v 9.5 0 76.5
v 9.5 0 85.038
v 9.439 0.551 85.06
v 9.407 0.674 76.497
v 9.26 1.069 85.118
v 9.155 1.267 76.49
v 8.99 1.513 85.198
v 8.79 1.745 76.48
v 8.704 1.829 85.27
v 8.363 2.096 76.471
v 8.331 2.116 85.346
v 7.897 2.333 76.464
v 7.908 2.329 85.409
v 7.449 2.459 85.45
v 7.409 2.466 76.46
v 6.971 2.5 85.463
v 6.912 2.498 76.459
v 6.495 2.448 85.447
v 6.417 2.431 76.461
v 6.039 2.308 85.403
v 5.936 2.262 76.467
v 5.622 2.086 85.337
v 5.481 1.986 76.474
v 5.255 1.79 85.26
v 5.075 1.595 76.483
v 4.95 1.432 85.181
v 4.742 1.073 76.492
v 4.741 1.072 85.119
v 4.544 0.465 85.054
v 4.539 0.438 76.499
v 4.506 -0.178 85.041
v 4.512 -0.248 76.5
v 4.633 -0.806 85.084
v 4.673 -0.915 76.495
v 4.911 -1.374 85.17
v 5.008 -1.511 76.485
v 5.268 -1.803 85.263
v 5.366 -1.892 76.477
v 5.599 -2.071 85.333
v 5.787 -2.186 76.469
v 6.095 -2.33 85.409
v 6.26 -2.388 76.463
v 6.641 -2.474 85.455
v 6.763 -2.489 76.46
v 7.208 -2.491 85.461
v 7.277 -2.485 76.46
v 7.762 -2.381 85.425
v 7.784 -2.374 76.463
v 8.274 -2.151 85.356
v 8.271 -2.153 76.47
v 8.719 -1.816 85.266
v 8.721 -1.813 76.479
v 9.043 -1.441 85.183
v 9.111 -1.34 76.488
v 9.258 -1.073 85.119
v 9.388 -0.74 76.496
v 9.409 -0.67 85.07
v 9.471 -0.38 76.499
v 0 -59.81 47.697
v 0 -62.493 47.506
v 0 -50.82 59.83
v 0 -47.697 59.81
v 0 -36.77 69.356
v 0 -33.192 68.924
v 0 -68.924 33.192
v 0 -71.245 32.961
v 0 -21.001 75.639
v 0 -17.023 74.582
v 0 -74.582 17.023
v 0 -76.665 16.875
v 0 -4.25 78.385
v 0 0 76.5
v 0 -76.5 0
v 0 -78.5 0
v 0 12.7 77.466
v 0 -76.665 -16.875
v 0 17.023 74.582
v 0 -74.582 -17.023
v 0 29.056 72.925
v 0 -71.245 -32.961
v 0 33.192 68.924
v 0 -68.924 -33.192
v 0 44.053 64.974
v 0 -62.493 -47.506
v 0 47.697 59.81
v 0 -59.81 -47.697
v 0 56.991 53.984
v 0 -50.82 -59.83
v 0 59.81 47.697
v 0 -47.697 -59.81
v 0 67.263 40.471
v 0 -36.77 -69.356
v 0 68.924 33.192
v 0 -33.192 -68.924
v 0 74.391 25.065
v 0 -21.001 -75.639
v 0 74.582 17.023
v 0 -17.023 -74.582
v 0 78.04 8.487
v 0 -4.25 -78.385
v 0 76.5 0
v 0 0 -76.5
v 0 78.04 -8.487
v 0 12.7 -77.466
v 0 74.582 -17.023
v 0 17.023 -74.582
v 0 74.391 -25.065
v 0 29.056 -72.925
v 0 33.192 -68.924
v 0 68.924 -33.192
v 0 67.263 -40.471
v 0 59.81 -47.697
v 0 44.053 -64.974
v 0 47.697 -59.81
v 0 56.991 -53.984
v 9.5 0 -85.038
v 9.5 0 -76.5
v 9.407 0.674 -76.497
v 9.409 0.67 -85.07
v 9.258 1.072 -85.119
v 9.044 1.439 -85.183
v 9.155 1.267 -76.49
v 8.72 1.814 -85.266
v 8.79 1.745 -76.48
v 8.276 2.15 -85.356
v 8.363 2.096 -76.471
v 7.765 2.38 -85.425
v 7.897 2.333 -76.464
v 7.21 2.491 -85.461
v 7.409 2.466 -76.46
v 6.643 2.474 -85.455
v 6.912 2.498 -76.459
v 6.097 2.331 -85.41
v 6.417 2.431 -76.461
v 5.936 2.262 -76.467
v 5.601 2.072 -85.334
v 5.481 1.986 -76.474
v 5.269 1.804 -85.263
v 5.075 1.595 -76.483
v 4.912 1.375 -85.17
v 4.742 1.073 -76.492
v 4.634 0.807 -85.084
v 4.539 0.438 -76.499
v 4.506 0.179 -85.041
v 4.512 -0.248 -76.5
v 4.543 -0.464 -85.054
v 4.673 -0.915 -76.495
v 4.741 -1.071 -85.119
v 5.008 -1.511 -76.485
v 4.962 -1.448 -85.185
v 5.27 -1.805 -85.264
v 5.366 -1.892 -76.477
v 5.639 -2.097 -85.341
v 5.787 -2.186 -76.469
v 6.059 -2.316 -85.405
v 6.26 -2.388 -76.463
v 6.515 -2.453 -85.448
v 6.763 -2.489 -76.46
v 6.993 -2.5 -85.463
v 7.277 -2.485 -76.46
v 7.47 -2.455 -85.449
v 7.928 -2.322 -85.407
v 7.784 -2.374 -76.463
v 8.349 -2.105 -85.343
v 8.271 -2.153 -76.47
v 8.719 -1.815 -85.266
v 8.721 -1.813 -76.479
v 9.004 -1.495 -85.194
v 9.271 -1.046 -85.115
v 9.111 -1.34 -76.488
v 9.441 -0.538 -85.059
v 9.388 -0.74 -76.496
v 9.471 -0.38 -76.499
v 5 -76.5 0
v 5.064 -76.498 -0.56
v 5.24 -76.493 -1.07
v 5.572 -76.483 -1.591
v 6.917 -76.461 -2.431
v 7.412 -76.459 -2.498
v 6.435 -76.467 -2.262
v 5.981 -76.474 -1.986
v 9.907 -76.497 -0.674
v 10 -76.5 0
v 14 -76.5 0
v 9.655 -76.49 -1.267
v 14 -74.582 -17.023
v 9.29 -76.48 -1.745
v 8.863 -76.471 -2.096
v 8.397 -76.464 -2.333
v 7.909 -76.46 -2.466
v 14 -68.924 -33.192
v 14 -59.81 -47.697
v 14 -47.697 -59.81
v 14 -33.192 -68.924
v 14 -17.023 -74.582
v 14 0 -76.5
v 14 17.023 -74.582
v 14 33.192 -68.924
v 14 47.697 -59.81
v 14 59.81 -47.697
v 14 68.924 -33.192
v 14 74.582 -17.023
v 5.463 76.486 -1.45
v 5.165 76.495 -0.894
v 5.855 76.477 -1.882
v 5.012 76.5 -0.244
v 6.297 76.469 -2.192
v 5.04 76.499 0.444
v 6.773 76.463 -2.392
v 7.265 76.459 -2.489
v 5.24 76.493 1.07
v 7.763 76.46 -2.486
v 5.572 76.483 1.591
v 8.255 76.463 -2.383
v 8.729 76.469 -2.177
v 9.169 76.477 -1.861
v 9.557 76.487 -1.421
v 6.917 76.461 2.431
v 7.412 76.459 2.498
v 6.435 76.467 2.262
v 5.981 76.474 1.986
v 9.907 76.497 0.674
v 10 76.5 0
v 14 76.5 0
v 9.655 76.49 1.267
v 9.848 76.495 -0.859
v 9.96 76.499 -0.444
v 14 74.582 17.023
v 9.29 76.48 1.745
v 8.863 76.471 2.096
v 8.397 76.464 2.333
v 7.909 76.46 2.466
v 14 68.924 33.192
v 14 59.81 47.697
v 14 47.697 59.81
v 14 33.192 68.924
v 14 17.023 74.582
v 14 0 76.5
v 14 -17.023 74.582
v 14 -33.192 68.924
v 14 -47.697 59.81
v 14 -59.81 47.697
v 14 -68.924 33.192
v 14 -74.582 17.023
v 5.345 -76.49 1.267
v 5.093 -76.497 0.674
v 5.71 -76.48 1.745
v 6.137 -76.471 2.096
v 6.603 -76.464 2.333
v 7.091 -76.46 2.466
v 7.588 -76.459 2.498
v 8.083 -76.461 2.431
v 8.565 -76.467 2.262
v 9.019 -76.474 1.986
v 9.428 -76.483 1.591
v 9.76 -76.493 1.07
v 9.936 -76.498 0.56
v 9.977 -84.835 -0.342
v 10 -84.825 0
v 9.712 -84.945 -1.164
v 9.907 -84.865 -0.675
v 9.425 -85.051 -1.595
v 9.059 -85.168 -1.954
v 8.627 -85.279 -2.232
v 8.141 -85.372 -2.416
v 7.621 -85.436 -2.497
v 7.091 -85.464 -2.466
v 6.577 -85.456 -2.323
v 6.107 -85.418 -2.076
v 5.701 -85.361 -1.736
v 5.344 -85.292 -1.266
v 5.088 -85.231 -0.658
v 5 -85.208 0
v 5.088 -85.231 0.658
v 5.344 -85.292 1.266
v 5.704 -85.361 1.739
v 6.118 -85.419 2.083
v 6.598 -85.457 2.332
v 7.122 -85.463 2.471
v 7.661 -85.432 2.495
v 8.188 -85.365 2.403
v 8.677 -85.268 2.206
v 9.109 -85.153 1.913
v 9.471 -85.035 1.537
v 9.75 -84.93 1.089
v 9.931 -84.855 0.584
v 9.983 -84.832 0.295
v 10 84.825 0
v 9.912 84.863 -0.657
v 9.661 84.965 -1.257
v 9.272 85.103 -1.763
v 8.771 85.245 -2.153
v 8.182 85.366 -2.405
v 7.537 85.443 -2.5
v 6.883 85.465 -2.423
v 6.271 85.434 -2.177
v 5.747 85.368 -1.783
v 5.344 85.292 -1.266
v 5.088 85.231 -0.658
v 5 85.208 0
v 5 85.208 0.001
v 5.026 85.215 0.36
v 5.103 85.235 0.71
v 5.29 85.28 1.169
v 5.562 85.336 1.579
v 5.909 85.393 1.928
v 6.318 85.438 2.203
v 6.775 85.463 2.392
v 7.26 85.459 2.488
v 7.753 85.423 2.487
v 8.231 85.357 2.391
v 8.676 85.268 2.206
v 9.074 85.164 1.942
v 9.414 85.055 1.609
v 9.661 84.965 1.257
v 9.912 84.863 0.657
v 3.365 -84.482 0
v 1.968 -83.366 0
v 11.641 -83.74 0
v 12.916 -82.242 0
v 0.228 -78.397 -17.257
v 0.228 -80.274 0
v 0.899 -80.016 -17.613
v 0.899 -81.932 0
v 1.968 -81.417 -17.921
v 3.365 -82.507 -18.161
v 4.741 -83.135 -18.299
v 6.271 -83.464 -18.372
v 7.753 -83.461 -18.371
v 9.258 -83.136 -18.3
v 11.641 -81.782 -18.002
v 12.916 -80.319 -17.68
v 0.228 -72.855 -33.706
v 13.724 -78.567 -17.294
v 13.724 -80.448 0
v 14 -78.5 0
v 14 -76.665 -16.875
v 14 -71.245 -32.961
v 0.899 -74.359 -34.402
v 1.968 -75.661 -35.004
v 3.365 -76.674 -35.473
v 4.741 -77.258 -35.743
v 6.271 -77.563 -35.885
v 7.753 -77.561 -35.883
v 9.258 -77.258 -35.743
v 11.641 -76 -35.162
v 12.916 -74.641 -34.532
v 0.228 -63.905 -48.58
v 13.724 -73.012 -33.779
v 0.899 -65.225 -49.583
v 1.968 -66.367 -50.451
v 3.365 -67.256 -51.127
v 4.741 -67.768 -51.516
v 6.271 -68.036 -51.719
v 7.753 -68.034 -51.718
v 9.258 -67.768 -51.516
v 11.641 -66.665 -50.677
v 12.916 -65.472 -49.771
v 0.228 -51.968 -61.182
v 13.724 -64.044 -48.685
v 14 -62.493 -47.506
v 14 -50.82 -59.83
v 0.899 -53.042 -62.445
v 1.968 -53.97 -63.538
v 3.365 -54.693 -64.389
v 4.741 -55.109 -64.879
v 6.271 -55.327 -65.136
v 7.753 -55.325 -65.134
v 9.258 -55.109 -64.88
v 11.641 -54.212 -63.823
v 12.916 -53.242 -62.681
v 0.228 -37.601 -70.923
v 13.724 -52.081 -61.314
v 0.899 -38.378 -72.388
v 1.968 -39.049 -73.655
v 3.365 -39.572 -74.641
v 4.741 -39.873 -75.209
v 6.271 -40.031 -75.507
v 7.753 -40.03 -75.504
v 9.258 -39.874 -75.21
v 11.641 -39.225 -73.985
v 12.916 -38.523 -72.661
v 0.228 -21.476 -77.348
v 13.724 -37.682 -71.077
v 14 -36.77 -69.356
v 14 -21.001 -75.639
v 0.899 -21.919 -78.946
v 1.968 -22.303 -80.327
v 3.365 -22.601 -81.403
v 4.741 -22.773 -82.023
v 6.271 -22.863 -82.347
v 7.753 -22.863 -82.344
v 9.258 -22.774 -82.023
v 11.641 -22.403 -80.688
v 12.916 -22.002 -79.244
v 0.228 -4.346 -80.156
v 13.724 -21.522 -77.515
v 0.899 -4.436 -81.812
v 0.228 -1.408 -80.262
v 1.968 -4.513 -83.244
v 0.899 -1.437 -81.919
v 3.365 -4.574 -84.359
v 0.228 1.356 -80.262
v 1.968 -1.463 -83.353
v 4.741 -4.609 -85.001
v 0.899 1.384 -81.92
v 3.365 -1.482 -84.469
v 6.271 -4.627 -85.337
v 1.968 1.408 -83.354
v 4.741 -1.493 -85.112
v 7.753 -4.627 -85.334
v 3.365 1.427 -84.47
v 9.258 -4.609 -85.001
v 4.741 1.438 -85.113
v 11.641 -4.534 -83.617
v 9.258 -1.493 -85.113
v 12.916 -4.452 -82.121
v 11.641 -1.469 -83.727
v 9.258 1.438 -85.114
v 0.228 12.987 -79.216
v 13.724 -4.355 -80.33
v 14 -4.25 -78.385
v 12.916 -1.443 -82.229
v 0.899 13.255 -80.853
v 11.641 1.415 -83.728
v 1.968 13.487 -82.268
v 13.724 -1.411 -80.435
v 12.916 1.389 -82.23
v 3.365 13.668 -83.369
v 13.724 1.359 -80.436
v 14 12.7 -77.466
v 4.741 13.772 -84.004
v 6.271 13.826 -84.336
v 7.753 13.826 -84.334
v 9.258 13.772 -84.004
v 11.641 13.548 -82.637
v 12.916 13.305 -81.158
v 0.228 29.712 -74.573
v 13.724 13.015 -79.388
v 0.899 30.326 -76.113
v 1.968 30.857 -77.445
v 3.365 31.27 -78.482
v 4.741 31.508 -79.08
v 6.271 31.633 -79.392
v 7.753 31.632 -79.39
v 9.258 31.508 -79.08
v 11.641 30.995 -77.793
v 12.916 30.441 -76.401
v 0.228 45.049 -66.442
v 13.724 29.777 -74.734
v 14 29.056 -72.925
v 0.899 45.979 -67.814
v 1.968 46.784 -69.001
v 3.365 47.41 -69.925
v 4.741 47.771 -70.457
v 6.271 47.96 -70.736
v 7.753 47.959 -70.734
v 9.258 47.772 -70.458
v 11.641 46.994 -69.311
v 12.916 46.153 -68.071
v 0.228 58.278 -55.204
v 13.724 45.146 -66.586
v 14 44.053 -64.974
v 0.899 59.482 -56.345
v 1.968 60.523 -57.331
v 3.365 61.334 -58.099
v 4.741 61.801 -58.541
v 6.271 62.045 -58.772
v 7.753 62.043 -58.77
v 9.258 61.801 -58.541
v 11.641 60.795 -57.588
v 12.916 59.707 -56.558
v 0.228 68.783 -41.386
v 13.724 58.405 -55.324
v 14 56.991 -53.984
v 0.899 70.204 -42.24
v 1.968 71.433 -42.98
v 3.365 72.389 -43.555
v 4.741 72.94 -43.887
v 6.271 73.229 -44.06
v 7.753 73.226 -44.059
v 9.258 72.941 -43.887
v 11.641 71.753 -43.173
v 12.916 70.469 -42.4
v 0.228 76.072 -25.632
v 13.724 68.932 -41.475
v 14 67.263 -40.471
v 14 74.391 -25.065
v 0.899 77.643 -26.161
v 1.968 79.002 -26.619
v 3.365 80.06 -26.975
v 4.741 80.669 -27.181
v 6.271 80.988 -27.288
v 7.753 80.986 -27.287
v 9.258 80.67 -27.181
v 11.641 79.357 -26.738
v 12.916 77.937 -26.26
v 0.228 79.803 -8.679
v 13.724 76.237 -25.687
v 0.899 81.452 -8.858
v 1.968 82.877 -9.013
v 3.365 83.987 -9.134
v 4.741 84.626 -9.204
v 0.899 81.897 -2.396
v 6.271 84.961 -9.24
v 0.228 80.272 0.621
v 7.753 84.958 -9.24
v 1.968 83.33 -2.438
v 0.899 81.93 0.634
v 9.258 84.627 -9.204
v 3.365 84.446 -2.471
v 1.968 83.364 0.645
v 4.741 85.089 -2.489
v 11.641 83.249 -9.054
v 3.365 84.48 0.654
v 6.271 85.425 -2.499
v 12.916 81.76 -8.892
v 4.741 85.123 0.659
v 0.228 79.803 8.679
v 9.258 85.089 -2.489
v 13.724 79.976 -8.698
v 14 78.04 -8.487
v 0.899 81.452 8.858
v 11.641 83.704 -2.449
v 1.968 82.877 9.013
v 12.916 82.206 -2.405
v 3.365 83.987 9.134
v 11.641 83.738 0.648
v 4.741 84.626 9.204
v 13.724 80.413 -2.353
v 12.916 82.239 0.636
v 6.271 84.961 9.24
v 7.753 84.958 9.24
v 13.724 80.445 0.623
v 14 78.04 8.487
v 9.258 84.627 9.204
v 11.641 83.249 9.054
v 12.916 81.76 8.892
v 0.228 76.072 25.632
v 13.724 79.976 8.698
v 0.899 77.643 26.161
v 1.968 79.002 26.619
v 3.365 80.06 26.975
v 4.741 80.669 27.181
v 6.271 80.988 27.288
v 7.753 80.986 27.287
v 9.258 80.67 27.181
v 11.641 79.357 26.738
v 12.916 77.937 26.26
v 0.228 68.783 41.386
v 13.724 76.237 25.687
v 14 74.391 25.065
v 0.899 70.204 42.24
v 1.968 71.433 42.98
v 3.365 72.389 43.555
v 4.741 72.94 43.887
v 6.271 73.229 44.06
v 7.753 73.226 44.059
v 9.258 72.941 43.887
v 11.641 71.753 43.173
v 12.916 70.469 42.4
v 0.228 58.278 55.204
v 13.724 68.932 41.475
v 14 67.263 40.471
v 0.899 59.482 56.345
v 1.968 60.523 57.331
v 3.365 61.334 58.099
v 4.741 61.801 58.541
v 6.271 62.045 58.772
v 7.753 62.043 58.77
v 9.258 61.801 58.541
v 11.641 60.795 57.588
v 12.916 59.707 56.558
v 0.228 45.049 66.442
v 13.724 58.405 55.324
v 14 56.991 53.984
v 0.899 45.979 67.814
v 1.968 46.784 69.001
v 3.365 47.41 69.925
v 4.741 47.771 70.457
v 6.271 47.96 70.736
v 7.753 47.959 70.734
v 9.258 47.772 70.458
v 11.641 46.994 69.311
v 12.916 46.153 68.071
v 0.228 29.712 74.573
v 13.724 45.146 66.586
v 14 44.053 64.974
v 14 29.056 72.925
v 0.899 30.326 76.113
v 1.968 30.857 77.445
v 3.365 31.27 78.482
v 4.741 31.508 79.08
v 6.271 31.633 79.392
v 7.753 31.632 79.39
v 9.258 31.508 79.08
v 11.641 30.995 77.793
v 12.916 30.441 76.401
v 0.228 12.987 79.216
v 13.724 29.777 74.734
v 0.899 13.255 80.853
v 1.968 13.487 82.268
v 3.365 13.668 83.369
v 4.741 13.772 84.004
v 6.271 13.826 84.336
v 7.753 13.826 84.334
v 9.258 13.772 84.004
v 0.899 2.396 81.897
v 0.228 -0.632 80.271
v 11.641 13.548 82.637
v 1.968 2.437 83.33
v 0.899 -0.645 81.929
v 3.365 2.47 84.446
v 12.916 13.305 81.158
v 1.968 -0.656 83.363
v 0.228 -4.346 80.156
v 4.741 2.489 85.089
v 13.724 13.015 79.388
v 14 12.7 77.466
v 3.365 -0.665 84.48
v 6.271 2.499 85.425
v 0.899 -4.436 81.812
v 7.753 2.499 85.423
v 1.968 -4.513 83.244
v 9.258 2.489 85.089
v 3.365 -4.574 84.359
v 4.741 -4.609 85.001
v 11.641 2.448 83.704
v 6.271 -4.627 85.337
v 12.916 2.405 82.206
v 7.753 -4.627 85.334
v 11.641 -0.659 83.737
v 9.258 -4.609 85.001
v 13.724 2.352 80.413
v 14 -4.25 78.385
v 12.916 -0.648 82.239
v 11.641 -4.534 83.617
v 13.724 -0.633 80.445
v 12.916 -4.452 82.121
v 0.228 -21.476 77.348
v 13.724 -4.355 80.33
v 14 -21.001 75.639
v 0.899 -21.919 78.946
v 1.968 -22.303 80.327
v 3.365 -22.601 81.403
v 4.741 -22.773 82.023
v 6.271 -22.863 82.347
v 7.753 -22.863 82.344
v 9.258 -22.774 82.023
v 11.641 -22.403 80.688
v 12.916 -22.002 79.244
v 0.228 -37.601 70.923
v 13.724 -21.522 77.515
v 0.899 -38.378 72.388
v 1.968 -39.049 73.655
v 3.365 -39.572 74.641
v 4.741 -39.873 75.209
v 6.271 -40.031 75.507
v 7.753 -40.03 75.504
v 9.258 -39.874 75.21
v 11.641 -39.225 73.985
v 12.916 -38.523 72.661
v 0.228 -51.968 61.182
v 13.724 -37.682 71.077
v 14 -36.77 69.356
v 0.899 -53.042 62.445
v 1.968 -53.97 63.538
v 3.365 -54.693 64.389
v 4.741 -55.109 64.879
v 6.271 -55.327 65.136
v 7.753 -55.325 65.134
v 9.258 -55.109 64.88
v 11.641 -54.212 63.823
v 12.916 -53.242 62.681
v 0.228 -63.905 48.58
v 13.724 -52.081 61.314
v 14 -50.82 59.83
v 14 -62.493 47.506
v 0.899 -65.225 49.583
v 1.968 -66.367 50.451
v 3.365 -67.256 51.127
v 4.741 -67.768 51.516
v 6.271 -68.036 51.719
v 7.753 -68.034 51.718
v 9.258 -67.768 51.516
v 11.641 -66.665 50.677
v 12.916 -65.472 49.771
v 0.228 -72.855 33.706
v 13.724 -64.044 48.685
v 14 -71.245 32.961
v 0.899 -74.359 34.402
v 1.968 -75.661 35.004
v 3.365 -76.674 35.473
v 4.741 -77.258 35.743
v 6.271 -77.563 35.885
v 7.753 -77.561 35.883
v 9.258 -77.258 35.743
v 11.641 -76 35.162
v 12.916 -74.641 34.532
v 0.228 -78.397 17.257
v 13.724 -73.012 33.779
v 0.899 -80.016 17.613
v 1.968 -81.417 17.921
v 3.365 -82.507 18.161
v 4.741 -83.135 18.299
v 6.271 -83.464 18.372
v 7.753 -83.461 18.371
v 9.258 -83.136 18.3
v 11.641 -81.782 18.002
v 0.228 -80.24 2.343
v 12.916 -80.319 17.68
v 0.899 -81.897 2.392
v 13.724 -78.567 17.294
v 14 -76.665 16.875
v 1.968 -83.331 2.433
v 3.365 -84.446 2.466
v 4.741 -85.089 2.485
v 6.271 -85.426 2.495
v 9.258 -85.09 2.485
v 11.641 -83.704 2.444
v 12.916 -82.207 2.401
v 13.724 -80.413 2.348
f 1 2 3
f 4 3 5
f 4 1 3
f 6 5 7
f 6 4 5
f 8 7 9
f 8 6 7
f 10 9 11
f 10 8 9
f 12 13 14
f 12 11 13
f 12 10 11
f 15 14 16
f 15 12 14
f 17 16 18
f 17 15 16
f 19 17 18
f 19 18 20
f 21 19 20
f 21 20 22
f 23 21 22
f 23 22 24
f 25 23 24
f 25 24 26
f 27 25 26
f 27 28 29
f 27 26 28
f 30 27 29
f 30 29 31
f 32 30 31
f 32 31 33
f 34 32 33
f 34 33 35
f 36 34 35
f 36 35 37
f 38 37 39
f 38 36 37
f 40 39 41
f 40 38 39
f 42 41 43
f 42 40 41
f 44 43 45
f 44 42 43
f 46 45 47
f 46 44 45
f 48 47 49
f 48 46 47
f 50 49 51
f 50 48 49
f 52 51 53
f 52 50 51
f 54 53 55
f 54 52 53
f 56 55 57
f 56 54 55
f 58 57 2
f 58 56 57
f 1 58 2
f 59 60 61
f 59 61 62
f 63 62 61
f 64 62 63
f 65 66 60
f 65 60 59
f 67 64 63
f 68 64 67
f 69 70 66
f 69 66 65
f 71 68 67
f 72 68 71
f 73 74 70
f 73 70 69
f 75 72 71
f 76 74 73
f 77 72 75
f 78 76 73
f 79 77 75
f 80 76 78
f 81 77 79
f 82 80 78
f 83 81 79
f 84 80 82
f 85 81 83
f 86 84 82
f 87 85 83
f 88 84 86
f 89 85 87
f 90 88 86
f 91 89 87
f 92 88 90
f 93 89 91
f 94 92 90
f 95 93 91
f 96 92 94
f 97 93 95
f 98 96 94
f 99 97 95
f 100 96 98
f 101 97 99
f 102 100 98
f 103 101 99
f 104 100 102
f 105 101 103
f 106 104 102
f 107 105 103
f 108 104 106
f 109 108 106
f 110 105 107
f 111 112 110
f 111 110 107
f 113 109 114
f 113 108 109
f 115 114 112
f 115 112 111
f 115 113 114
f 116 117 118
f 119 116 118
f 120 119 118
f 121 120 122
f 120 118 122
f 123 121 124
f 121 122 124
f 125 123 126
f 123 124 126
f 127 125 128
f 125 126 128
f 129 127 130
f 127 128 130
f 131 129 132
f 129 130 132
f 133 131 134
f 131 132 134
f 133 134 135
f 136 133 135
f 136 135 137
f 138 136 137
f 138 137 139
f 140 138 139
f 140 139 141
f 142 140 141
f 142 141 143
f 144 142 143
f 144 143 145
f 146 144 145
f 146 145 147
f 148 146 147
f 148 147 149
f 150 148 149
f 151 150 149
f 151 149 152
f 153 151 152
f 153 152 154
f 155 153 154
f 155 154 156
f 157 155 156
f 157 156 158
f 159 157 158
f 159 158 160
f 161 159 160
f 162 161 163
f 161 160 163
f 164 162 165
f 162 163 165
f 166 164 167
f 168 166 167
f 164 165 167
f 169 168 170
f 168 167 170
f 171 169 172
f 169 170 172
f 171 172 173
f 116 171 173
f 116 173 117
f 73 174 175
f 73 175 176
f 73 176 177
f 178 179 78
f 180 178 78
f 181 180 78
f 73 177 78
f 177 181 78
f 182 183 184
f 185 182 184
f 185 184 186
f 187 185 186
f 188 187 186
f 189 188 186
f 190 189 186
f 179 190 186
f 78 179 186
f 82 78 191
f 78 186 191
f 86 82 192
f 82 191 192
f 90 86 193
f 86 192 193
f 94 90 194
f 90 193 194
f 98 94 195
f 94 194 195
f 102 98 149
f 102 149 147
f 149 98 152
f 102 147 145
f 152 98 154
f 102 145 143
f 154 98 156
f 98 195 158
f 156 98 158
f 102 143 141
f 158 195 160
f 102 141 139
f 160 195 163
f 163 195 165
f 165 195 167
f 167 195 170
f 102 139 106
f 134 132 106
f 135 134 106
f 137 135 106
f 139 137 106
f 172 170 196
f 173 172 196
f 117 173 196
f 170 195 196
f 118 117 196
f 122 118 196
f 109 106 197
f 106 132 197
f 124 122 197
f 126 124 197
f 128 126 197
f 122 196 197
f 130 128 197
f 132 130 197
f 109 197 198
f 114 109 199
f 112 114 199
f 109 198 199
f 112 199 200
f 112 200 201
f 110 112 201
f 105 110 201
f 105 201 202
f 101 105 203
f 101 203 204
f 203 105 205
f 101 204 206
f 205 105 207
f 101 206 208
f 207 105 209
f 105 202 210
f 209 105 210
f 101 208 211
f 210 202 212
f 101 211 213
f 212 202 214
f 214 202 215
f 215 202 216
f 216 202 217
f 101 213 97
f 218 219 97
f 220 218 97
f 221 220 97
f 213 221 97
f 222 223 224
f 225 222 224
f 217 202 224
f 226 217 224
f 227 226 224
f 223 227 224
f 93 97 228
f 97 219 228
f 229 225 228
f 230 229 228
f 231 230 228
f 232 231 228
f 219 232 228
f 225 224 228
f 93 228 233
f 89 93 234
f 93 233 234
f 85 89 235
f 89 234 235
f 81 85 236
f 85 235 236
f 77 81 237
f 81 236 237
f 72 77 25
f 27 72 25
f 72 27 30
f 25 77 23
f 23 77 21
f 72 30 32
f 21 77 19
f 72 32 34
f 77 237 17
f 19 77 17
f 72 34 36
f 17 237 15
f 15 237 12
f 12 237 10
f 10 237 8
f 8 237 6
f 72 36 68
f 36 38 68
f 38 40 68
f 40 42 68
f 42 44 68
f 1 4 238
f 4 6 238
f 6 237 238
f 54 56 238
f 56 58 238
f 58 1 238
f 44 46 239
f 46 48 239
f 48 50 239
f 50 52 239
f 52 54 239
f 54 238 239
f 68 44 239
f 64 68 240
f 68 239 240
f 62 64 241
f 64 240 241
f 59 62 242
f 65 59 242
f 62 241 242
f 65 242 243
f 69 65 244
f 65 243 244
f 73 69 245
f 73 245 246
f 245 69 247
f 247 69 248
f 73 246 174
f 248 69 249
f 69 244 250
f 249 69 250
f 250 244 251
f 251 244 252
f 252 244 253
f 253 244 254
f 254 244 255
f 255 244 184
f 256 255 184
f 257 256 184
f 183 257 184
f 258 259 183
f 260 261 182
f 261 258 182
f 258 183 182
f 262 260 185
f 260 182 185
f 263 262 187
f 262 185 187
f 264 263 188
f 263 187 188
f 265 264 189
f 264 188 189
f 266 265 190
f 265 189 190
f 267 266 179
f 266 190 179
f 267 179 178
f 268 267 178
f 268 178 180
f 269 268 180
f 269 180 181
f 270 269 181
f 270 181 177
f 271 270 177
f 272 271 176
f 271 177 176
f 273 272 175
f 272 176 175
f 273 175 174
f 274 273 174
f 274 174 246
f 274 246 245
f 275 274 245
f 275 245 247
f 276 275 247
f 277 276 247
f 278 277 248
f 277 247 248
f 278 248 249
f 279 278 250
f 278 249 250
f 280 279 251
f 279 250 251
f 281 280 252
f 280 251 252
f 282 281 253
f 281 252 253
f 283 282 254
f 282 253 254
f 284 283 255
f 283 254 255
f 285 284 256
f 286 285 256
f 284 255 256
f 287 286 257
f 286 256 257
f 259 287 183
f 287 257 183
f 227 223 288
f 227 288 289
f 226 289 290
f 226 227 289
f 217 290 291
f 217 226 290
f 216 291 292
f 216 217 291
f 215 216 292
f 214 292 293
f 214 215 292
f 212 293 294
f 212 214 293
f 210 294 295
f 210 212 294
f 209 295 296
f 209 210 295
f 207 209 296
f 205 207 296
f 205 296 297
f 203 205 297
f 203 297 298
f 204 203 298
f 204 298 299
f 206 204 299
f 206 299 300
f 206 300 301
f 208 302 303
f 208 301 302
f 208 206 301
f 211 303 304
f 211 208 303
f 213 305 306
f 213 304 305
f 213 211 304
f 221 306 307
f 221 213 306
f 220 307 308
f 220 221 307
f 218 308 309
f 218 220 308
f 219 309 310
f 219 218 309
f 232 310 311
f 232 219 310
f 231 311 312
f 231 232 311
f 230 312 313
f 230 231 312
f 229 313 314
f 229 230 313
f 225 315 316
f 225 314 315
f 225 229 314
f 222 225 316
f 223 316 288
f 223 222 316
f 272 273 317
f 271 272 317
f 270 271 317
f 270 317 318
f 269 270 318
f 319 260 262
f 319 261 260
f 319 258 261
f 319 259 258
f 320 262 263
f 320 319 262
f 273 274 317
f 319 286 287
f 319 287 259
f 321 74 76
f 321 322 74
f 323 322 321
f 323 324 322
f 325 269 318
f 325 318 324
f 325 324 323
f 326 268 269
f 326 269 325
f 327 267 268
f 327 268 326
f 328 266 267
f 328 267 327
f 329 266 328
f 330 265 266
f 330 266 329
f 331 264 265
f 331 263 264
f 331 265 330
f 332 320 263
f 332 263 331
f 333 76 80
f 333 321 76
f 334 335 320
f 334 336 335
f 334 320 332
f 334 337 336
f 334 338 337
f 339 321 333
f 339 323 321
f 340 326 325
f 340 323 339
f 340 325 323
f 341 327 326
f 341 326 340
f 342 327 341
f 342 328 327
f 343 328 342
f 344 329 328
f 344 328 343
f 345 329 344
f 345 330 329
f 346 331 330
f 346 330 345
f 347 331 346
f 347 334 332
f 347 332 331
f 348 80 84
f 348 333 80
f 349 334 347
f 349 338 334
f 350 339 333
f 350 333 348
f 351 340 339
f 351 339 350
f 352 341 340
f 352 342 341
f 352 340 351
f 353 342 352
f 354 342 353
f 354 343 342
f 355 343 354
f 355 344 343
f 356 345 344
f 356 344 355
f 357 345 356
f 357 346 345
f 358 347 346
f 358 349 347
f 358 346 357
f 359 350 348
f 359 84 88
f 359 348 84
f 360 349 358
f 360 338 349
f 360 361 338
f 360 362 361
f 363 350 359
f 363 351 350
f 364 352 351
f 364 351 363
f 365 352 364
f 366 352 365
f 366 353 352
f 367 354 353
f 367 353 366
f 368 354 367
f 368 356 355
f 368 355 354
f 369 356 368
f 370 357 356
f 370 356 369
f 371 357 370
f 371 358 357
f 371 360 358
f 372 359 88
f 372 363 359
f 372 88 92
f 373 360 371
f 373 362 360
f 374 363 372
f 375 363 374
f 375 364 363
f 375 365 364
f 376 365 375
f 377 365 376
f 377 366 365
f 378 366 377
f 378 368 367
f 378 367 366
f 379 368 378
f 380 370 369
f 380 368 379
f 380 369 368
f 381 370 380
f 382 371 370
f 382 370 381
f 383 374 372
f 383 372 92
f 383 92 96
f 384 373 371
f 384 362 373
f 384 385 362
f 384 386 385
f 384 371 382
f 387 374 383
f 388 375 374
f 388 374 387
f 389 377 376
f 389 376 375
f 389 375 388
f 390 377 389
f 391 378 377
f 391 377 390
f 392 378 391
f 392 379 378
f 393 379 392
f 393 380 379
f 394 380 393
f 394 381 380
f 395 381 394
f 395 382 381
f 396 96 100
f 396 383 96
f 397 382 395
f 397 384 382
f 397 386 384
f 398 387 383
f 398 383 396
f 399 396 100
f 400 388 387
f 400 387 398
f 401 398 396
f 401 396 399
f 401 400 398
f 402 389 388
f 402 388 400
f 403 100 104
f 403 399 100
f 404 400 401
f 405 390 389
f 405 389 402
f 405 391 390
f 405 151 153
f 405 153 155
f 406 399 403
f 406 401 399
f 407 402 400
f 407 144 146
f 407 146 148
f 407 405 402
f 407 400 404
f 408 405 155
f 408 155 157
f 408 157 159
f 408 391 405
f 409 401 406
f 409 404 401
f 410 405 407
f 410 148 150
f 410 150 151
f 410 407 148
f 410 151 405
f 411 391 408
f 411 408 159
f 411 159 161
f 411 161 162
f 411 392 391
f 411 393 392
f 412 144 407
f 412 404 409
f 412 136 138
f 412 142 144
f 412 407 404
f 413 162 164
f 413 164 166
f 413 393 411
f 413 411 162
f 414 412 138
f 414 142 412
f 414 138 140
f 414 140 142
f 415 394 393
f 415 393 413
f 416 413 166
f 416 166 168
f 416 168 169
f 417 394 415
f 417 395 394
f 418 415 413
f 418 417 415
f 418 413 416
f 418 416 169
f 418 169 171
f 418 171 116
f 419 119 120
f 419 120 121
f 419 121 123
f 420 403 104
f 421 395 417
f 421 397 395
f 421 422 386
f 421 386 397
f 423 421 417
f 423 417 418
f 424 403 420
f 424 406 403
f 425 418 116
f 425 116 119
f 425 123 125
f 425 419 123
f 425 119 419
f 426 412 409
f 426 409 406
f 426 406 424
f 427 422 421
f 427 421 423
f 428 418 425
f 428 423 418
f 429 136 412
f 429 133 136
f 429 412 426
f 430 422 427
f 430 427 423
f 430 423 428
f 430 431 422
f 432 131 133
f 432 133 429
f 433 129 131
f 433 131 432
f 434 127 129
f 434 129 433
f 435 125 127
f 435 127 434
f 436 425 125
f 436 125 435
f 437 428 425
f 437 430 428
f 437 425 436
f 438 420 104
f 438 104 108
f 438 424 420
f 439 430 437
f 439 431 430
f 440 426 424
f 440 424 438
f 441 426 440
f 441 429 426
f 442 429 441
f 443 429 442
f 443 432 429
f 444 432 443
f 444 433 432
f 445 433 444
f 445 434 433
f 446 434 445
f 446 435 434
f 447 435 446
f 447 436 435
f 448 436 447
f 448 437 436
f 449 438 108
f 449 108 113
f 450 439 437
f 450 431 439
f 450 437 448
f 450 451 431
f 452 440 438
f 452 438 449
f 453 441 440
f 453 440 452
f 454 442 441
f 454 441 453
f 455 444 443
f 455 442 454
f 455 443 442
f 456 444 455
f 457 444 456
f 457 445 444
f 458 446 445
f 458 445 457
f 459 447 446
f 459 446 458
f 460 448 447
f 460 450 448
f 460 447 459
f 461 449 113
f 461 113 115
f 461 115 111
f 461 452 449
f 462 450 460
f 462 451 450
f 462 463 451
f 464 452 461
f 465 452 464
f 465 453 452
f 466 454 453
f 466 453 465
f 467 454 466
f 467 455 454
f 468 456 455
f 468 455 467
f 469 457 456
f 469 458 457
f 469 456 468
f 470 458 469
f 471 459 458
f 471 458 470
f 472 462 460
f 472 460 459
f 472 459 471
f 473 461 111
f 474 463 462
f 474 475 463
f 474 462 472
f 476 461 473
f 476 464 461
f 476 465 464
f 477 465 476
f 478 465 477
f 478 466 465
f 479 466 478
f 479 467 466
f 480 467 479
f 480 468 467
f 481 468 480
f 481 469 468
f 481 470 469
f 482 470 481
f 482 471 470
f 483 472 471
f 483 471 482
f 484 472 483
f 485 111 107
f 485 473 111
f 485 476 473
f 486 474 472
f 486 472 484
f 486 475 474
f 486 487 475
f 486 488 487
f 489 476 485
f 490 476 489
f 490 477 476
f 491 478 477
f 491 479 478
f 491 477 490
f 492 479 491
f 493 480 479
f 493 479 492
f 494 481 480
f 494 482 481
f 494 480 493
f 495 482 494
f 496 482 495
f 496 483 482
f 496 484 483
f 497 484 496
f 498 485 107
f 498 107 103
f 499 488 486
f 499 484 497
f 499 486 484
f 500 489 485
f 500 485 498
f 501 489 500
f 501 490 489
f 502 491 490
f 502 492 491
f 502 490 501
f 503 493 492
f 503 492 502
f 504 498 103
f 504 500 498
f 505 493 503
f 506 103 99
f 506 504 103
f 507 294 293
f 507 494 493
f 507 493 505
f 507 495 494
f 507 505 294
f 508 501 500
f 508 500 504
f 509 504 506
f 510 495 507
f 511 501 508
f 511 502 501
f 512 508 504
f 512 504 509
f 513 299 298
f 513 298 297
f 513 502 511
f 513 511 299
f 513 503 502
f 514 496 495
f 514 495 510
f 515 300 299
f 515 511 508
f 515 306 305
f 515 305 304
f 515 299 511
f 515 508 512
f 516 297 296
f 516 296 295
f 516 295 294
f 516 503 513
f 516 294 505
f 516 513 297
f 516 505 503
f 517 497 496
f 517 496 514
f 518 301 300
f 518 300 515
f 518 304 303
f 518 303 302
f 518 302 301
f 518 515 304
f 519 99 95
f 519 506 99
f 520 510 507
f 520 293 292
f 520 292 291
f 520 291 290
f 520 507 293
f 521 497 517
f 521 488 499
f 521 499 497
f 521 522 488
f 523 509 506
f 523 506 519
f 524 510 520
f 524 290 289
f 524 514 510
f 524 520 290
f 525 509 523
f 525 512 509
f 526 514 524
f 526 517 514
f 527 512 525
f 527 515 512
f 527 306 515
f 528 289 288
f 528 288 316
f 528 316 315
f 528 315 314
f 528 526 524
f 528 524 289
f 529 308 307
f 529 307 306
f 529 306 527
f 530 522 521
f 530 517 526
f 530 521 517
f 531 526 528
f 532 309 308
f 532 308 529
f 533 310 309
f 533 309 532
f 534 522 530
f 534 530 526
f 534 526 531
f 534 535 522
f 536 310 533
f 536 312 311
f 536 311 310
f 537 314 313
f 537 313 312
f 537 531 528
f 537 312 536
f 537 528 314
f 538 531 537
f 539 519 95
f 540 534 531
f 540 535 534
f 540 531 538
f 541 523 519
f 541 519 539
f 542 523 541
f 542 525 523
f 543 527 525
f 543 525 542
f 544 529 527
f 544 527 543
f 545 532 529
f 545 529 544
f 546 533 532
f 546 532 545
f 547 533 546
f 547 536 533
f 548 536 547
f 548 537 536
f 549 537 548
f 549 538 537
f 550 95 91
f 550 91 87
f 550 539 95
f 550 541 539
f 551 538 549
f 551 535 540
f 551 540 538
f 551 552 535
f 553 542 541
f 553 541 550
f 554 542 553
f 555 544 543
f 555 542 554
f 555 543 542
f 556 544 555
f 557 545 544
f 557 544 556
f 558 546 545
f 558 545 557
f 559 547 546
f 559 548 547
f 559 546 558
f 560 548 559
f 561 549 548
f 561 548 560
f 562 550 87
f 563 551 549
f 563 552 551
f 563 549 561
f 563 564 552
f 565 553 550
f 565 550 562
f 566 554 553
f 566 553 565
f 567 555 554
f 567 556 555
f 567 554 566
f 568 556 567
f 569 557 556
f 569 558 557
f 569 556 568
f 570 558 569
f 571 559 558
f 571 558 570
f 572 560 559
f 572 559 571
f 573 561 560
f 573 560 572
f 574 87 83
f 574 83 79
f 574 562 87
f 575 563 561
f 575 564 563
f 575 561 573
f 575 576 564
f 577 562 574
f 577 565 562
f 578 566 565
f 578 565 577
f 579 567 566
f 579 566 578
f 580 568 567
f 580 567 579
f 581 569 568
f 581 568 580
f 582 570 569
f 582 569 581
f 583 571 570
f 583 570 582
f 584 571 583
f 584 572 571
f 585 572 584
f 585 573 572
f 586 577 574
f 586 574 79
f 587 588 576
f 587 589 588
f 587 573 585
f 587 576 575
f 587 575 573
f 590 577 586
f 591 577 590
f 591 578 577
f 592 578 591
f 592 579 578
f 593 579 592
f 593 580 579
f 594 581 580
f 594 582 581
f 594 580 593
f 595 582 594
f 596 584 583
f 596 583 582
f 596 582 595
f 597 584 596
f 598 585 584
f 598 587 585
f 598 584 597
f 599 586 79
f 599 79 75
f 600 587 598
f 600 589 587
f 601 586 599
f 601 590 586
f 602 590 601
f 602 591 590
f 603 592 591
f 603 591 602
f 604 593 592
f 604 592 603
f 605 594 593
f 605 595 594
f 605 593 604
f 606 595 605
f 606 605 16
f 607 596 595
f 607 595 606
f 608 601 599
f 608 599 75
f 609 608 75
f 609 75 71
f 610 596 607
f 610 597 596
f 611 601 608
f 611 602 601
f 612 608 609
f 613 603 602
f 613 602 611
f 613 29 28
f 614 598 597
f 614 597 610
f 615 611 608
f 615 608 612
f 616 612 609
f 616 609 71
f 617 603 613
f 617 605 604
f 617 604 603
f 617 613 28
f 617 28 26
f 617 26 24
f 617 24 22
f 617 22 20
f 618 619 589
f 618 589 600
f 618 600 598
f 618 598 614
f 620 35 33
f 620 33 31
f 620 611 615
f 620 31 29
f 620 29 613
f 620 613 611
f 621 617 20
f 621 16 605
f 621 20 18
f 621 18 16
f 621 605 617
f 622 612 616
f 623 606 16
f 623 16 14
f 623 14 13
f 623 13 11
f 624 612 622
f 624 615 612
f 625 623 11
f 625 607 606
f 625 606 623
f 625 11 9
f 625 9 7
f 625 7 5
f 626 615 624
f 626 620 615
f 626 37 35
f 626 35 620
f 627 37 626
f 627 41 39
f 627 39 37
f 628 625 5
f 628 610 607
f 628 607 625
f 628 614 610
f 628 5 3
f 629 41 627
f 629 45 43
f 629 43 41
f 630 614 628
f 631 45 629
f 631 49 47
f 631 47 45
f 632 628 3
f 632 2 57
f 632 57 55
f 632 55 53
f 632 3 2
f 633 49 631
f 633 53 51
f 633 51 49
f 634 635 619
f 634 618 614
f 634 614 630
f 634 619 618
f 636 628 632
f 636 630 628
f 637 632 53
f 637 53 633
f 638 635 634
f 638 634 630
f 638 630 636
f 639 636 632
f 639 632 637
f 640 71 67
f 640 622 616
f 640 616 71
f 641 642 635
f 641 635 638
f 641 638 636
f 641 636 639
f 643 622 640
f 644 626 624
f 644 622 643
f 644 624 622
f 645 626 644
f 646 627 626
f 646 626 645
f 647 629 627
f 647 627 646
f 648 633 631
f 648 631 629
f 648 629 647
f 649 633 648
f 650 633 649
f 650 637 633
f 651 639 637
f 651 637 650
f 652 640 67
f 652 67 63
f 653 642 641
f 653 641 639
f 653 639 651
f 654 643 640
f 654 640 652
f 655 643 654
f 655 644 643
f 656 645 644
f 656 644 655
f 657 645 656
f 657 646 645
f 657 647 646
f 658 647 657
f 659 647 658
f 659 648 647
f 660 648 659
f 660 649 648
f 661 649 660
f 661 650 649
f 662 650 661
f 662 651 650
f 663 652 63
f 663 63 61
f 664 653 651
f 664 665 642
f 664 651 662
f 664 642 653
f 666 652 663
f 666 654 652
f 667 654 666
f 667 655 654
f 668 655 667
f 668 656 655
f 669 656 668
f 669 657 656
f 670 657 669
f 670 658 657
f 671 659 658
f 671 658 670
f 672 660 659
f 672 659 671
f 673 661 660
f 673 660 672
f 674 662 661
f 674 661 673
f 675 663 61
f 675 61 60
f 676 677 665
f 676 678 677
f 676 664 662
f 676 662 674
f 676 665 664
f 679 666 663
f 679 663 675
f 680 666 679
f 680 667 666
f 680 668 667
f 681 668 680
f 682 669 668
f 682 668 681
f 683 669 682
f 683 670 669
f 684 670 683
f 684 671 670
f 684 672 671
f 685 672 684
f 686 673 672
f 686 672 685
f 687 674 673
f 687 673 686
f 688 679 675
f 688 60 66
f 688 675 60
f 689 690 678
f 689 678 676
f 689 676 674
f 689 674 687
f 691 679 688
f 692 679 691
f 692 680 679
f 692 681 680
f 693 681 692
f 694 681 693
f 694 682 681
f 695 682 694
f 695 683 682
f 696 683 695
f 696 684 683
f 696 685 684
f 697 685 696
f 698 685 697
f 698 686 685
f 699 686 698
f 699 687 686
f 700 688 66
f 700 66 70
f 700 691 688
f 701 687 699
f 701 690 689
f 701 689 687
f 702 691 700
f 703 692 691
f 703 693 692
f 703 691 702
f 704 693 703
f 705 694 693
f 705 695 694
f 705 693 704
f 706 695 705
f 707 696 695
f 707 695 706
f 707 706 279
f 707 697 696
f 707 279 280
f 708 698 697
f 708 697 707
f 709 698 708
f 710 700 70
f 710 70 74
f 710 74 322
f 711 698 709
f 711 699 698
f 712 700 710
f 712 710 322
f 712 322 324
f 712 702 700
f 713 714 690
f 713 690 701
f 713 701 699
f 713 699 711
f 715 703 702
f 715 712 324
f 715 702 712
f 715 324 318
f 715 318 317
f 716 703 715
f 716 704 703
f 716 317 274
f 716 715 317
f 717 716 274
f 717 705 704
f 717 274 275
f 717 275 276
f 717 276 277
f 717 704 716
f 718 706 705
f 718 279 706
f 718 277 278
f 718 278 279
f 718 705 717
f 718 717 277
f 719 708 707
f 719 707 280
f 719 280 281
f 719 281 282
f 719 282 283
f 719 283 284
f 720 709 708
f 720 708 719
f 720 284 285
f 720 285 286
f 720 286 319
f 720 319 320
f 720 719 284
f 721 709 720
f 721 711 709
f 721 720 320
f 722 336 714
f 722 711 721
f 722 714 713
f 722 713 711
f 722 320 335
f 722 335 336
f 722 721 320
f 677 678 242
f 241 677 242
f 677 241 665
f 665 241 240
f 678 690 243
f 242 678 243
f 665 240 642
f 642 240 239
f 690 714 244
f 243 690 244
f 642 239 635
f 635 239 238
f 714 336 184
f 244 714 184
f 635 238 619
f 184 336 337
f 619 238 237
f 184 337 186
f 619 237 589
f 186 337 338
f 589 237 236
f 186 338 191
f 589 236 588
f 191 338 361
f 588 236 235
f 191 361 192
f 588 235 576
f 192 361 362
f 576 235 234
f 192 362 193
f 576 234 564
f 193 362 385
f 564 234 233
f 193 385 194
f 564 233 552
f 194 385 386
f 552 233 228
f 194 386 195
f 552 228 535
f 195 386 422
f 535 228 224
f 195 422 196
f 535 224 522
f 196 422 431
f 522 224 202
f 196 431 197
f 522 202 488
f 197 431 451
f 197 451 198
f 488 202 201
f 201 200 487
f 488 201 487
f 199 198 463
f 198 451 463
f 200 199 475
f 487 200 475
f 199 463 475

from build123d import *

# Parameters (mm, degrees)
SKETCH1_W                      = 14
SKETCH1_H                      = 2
CUT_EXTRUDE1_REACH             = 123.723
SKETCH1_3_R                    = 2.5
CUT_EXTRUDE1_DIRECTION_2_REACH = 123.723
CUT_EXTRUDE2_REACH             = 123.697
CUT_EXTRUDE2_DIRECTION_2_REACH = 123.697


with BuildPart() as part:
    # Sketch1 → Revolve1 (revolve)
    with BuildSketch(Plane.XY, mode=Mode.PRIVATE) as revolve1_sk:
        with Locations((7, 77.5)):
            Rectangle(SKETCH1_W, SKETCH1_H)
        with BuildLine():
            ThreePointArc((0, 78.5), (7, 85.5), (14, 78.5))
            Line((14, 78.5), (0, 78.5))
        make_face()
    revolve(revolve1_sk.sketch.rotate(Axis((0, 0, 0), (1, 0, 0)), 180), axis=Axis((0, 0, 0), (1, 0, 0)))

    # Sketch1<3> → Cut-Extrude1 (cut, up to next)
    with BuildSketch(Plane.XY, mode=Mode.PRIVATE) as cut_extrude1_sk1:
        with Locations((7, 0)):
            Circle(SKETCH1_3_R)
    cut_extrude1_tool1 = extrude(cut_extrude1_sk1.sketch, amount=-CUT_EXTRUDE1_REACH, mode=Mode.PRIVATE) & part.part
    add(cut_extrude1_tool1.solids().sort_by_distance((7, 0, 0))[0], mode=Mode.SUBTRACT)

    # Sketch1<3> → Cut-Extrude1 direction 2 (cut, up to next)
    with BuildSketch(Plane.XY, mode=Mode.PRIVATE) as cut_extrude1_direction_2_sk1:
        with Locations((7, 0)):
            Circle(SKETCH1_3_R)
    cut_extrude1_direction_2_tool1 = extrude(cut_extrude1_direction_2_sk1.sketch, amount=CUT_EXTRUDE1_DIRECTION_2_REACH, mode=Mode.PRIVATE) & part.part
    add(cut_extrude1_direction_2_tool1.solids().sort_by_distance((7, 0, 0))[0], mode=Mode.SUBTRACT)

    # Sketch2 → Cut-Extrude2 (cut, up to next)
    with BuildSketch(Plane(origin=(0, 0, 0), x_dir=(1, 0, 0), z_dir=(0, 1, 0)), mode=Mode.PRIVATE) as cut_extrude2_sk1:
        with BuildLine():
            ThreePointArc((10, 0), (7.5, 2.5), (5, 0))
            Line((5, 0), (10, 0))
        make_face()
    cut_extrude2_tool1 = extrude(cut_extrude2_sk1.sketch, amount=-CUT_EXTRUDE2_REACH, mode=Mode.PRIVATE) & part.part
    # Sketch2 → Cut-Extrude2 (cut, up to next)
    with BuildSketch(Plane(origin=(0, 0, 0), x_dir=(1, 0, 0), z_dir=(0, 1, 0)), mode=Mode.PRIVATE) as cut_extrude2_sk2:
        with BuildLine():
            Line((10, 0), (5, 0))
            ThreePointArc((5, 0), (7.5, -2.5), (10, 0))
        make_face()
    cut_extrude2_tool2 = extrude(cut_extrude2_sk2.sketch, amount=-CUT_EXTRUDE2_REACH, mode=Mode.PRIVATE) & part.part
    # Sketch2 → Cut-Extrude2 (cut, up to next)
    with BuildSketch(Plane(origin=(0, 0, 0), x_dir=(1, 0, 0), z_dir=(0, 1, 0)), mode=Mode.PRIVATE) as cut_extrude2_sk3:
        with BuildLine():
            ThreePointArc((10, 0), (7.5, 2.5), (5, 0))
            Line((5, 0), (10, 0))
        make_face()
    cut_extrude2_tool3 = extrude(cut_extrude2_sk3.sketch, amount=-CUT_EXTRUDE2_REACH, mode=Mode.PRIVATE) & part.part
    # Sketch2 → Cut-Extrude2 (cut, up to next)
    with BuildSketch(Plane(origin=(0, 0, 0), x_dir=(1, 0, 0), z_dir=(0, 1, 0)), mode=Mode.PRIVATE) as cut_extrude2_sk4:
        with BuildLine():
            Line((10, 0), (5, 0))
            ThreePointArc((5, 0), (7.5, -2.5), (10, 0))
        make_face()
    cut_extrude2_tool4 = extrude(cut_extrude2_sk4.sketch, amount=-CUT_EXTRUDE2_REACH, mode=Mode.PRIVATE) & part.part
    add(cut_extrude2_tool1.solids().sort_by_distance((7.5, 0, -1.061033))[0], mode=Mode.SUBTRACT)
    add(cut_extrude2_tool2.solids().sort_by_distance((7.5, 0, 1.061033))[0], mode=Mode.SUBTRACT)
    add(cut_extrude2_tool3.solids().sort_by_distance((7.5, 0, -1.061033))[0], mode=Mode.SUBTRACT)
    add(cut_extrude2_tool4.solids().sort_by_distance((7.5, 0, 1.061033))[0], mode=Mode.SUBTRACT)

    # Sketch2 → Cut-Extrude2 direction 2 (cut, up to next)
    with BuildSketch(Plane(origin=(0, 0, 0), x_dir=(1, 0, 0), z_dir=(0, 1, 0)), mode=Mode.PRIVATE) as cut_extrude2_direction_2_sk1:
        with BuildLine():
            ThreePointArc((10, 0), (7.5, 2.5), (5, 0))
            Line((5, 0), (10, 0))
        make_face()
    cut_extrude2_direction_2_tool1 = extrude(cut_extrude2_direction_2_sk1.sketch, amount=CUT_EXTRUDE2_DIRECTION_2_REACH, mode=Mode.PRIVATE) & part.part
    # Sketch2 → Cut-Extrude2 direction 2 (cut, up to next)
    with BuildSketch(Plane(origin=(0, 0, 0), x_dir=(1, 0, 0), z_dir=(0, 1, 0)), mode=Mode.PRIVATE) as cut_extrude2_direction_2_sk2:
        with BuildLine():
            Line((10, 0), (5, 0))
            ThreePointArc((5, 0), (7.5, -2.5), (10, 0))
        make_face()
    cut_extrude2_direction_2_tool2 = extrude(cut_extrude2_direction_2_sk2.sketch, amount=CUT_EXTRUDE2_DIRECTION_2_REACH, mode=Mode.PRIVATE) & part.part
    # Sketch2 → Cut-Extrude2 direction 2 (cut, up to next)
    with BuildSketch(Plane(origin=(0, 0, 0), x_dir=(1, 0, 0), z_dir=(0, 1, 0)), mode=Mode.PRIVATE) as cut_extrude2_direction_2_sk3:
        with BuildLine():
            ThreePointArc((10, 0), (7.5, 2.5), (5, 0))
            Line((5, 0), (10, 0))
        make_face()
    cut_extrude2_direction_2_tool3 = extrude(cut_extrude2_direction_2_sk3.sketch, amount=CUT_EXTRUDE2_DIRECTION_2_REACH, mode=Mode.PRIVATE) & part.part
    # Sketch2 → Cut-Extrude2 direction 2 (cut, up to next)
    with BuildSketch(Plane(origin=(0, 0, 0), x_dir=(1, 0, 0), z_dir=(0, 1, 0)), mode=Mode.PRIVATE) as cut_extrude2_direction_2_sk4:
        with BuildLine():
            Line((10, 0), (5, 0))
            ThreePointArc((5, 0), (7.5, -2.5), (10, 0))
        make_face()
    cut_extrude2_direction_2_tool4 = extrude(cut_extrude2_direction_2_sk4.sketch, amount=CUT_EXTRUDE2_DIRECTION_2_REACH, mode=Mode.PRIVATE) & part.part
    add(cut_extrude2_direction_2_tool1.solids().sort_by_distance((7.5, 0, -1.061033))[0], mode=Mode.SUBTRACT)
    add(cut_extrude2_direction_2_tool2.solids().sort_by_distance((7.5, 0, 1.061033))[0], mode=Mode.SUBTRACT)
    add(cut_extrude2_direction_2_tool3.solids().sort_by_distance((7.5, 0, -1.061033))[0], mode=Mode.SUBTRACT)
    add(cut_extrude2_direction_2_tool4.solids().sort_by_distance((7.5, 0, 1.061033))[0], mode=Mode.SUBTRACT)


solid = part.part
